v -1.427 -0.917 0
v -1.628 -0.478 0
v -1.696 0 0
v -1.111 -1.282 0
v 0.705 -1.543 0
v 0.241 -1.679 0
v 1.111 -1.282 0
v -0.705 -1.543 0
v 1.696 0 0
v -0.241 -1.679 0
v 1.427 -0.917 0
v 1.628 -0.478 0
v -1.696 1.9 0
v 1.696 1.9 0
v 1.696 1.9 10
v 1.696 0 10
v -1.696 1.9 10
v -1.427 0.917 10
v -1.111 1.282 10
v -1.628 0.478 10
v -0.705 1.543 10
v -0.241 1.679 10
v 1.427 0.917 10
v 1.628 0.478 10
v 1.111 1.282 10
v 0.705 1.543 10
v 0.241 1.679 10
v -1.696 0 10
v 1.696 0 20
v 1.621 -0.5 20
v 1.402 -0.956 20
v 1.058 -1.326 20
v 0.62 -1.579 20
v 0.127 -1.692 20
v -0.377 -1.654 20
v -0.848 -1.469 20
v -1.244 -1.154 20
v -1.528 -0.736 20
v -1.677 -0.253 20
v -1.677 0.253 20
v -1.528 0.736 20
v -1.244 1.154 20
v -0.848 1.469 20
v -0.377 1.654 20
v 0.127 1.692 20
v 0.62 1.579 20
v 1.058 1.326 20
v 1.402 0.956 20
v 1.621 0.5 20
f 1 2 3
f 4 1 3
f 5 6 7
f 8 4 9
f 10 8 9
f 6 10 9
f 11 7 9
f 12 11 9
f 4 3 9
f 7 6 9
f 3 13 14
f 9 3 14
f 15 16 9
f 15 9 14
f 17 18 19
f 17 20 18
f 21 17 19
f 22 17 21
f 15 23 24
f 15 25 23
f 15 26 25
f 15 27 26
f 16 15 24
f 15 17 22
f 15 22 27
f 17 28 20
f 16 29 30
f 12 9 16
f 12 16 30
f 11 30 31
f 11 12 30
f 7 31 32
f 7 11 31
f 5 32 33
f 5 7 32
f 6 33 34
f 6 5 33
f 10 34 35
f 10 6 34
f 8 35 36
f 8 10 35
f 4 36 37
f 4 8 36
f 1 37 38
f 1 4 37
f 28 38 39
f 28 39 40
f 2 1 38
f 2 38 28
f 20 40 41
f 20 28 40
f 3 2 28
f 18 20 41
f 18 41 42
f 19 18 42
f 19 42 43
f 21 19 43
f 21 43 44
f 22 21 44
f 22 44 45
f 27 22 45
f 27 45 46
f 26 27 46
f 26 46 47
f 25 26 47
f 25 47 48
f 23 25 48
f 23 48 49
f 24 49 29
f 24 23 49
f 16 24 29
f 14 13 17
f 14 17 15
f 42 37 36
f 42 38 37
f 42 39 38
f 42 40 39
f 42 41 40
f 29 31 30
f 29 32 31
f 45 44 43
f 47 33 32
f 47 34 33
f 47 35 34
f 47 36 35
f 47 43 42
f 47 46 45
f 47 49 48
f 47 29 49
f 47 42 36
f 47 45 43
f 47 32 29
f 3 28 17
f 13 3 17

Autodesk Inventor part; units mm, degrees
ref_plane "YZ Plane" through (0, 0, 0) normal (1, 0, 0) x (0, 1, 0)
ref_plane "XZ Plane" through (0, 0, 0) normal (0, 1, 0) x (-1, 0, 0)
ref_plane "XY Plane" through (0, 0, 0) normal (0, 0, 1) x (1, 0, 0)
sketch "Sketch1" plane through (0, 0, 0) normal (0, 0, 1) x (1, 0, 0)
  circle A0 centre (0, 0) radius 1.6964
  line L0 (0, 0) -> (1.6964, 0)
  line L1 (1.6964, 0) -> (1.6964, 1.8999)
  line L2 (1.6964, 1.8999) -> (0, 1.8999)
  line L3 (0, 1.8999) -> (0, 0)
  line L4 (0, 0) -> (-1.6964, 0)
  line L5 (-1.6964, 0) -> (-1.6964, 1.8999)
  line L6 (-1.6964, 1.8999) -> (0, 1.8999)
  line L7 (0, 1.8999) -> (0, 0)
  point P0 (0, 1.6964)
extrude "Extrusion1" add sketch "Sketch1" along normal blind 20 contours L4 L0 A0 | A0 L3 L4 | L0 L3 A0
extrude "Extrusion2" add sketch "Sketch1" along normal blind 10 contours L5 L6 L3 A0 | A0 L3 L2 L1
properties part number "Sensor"
